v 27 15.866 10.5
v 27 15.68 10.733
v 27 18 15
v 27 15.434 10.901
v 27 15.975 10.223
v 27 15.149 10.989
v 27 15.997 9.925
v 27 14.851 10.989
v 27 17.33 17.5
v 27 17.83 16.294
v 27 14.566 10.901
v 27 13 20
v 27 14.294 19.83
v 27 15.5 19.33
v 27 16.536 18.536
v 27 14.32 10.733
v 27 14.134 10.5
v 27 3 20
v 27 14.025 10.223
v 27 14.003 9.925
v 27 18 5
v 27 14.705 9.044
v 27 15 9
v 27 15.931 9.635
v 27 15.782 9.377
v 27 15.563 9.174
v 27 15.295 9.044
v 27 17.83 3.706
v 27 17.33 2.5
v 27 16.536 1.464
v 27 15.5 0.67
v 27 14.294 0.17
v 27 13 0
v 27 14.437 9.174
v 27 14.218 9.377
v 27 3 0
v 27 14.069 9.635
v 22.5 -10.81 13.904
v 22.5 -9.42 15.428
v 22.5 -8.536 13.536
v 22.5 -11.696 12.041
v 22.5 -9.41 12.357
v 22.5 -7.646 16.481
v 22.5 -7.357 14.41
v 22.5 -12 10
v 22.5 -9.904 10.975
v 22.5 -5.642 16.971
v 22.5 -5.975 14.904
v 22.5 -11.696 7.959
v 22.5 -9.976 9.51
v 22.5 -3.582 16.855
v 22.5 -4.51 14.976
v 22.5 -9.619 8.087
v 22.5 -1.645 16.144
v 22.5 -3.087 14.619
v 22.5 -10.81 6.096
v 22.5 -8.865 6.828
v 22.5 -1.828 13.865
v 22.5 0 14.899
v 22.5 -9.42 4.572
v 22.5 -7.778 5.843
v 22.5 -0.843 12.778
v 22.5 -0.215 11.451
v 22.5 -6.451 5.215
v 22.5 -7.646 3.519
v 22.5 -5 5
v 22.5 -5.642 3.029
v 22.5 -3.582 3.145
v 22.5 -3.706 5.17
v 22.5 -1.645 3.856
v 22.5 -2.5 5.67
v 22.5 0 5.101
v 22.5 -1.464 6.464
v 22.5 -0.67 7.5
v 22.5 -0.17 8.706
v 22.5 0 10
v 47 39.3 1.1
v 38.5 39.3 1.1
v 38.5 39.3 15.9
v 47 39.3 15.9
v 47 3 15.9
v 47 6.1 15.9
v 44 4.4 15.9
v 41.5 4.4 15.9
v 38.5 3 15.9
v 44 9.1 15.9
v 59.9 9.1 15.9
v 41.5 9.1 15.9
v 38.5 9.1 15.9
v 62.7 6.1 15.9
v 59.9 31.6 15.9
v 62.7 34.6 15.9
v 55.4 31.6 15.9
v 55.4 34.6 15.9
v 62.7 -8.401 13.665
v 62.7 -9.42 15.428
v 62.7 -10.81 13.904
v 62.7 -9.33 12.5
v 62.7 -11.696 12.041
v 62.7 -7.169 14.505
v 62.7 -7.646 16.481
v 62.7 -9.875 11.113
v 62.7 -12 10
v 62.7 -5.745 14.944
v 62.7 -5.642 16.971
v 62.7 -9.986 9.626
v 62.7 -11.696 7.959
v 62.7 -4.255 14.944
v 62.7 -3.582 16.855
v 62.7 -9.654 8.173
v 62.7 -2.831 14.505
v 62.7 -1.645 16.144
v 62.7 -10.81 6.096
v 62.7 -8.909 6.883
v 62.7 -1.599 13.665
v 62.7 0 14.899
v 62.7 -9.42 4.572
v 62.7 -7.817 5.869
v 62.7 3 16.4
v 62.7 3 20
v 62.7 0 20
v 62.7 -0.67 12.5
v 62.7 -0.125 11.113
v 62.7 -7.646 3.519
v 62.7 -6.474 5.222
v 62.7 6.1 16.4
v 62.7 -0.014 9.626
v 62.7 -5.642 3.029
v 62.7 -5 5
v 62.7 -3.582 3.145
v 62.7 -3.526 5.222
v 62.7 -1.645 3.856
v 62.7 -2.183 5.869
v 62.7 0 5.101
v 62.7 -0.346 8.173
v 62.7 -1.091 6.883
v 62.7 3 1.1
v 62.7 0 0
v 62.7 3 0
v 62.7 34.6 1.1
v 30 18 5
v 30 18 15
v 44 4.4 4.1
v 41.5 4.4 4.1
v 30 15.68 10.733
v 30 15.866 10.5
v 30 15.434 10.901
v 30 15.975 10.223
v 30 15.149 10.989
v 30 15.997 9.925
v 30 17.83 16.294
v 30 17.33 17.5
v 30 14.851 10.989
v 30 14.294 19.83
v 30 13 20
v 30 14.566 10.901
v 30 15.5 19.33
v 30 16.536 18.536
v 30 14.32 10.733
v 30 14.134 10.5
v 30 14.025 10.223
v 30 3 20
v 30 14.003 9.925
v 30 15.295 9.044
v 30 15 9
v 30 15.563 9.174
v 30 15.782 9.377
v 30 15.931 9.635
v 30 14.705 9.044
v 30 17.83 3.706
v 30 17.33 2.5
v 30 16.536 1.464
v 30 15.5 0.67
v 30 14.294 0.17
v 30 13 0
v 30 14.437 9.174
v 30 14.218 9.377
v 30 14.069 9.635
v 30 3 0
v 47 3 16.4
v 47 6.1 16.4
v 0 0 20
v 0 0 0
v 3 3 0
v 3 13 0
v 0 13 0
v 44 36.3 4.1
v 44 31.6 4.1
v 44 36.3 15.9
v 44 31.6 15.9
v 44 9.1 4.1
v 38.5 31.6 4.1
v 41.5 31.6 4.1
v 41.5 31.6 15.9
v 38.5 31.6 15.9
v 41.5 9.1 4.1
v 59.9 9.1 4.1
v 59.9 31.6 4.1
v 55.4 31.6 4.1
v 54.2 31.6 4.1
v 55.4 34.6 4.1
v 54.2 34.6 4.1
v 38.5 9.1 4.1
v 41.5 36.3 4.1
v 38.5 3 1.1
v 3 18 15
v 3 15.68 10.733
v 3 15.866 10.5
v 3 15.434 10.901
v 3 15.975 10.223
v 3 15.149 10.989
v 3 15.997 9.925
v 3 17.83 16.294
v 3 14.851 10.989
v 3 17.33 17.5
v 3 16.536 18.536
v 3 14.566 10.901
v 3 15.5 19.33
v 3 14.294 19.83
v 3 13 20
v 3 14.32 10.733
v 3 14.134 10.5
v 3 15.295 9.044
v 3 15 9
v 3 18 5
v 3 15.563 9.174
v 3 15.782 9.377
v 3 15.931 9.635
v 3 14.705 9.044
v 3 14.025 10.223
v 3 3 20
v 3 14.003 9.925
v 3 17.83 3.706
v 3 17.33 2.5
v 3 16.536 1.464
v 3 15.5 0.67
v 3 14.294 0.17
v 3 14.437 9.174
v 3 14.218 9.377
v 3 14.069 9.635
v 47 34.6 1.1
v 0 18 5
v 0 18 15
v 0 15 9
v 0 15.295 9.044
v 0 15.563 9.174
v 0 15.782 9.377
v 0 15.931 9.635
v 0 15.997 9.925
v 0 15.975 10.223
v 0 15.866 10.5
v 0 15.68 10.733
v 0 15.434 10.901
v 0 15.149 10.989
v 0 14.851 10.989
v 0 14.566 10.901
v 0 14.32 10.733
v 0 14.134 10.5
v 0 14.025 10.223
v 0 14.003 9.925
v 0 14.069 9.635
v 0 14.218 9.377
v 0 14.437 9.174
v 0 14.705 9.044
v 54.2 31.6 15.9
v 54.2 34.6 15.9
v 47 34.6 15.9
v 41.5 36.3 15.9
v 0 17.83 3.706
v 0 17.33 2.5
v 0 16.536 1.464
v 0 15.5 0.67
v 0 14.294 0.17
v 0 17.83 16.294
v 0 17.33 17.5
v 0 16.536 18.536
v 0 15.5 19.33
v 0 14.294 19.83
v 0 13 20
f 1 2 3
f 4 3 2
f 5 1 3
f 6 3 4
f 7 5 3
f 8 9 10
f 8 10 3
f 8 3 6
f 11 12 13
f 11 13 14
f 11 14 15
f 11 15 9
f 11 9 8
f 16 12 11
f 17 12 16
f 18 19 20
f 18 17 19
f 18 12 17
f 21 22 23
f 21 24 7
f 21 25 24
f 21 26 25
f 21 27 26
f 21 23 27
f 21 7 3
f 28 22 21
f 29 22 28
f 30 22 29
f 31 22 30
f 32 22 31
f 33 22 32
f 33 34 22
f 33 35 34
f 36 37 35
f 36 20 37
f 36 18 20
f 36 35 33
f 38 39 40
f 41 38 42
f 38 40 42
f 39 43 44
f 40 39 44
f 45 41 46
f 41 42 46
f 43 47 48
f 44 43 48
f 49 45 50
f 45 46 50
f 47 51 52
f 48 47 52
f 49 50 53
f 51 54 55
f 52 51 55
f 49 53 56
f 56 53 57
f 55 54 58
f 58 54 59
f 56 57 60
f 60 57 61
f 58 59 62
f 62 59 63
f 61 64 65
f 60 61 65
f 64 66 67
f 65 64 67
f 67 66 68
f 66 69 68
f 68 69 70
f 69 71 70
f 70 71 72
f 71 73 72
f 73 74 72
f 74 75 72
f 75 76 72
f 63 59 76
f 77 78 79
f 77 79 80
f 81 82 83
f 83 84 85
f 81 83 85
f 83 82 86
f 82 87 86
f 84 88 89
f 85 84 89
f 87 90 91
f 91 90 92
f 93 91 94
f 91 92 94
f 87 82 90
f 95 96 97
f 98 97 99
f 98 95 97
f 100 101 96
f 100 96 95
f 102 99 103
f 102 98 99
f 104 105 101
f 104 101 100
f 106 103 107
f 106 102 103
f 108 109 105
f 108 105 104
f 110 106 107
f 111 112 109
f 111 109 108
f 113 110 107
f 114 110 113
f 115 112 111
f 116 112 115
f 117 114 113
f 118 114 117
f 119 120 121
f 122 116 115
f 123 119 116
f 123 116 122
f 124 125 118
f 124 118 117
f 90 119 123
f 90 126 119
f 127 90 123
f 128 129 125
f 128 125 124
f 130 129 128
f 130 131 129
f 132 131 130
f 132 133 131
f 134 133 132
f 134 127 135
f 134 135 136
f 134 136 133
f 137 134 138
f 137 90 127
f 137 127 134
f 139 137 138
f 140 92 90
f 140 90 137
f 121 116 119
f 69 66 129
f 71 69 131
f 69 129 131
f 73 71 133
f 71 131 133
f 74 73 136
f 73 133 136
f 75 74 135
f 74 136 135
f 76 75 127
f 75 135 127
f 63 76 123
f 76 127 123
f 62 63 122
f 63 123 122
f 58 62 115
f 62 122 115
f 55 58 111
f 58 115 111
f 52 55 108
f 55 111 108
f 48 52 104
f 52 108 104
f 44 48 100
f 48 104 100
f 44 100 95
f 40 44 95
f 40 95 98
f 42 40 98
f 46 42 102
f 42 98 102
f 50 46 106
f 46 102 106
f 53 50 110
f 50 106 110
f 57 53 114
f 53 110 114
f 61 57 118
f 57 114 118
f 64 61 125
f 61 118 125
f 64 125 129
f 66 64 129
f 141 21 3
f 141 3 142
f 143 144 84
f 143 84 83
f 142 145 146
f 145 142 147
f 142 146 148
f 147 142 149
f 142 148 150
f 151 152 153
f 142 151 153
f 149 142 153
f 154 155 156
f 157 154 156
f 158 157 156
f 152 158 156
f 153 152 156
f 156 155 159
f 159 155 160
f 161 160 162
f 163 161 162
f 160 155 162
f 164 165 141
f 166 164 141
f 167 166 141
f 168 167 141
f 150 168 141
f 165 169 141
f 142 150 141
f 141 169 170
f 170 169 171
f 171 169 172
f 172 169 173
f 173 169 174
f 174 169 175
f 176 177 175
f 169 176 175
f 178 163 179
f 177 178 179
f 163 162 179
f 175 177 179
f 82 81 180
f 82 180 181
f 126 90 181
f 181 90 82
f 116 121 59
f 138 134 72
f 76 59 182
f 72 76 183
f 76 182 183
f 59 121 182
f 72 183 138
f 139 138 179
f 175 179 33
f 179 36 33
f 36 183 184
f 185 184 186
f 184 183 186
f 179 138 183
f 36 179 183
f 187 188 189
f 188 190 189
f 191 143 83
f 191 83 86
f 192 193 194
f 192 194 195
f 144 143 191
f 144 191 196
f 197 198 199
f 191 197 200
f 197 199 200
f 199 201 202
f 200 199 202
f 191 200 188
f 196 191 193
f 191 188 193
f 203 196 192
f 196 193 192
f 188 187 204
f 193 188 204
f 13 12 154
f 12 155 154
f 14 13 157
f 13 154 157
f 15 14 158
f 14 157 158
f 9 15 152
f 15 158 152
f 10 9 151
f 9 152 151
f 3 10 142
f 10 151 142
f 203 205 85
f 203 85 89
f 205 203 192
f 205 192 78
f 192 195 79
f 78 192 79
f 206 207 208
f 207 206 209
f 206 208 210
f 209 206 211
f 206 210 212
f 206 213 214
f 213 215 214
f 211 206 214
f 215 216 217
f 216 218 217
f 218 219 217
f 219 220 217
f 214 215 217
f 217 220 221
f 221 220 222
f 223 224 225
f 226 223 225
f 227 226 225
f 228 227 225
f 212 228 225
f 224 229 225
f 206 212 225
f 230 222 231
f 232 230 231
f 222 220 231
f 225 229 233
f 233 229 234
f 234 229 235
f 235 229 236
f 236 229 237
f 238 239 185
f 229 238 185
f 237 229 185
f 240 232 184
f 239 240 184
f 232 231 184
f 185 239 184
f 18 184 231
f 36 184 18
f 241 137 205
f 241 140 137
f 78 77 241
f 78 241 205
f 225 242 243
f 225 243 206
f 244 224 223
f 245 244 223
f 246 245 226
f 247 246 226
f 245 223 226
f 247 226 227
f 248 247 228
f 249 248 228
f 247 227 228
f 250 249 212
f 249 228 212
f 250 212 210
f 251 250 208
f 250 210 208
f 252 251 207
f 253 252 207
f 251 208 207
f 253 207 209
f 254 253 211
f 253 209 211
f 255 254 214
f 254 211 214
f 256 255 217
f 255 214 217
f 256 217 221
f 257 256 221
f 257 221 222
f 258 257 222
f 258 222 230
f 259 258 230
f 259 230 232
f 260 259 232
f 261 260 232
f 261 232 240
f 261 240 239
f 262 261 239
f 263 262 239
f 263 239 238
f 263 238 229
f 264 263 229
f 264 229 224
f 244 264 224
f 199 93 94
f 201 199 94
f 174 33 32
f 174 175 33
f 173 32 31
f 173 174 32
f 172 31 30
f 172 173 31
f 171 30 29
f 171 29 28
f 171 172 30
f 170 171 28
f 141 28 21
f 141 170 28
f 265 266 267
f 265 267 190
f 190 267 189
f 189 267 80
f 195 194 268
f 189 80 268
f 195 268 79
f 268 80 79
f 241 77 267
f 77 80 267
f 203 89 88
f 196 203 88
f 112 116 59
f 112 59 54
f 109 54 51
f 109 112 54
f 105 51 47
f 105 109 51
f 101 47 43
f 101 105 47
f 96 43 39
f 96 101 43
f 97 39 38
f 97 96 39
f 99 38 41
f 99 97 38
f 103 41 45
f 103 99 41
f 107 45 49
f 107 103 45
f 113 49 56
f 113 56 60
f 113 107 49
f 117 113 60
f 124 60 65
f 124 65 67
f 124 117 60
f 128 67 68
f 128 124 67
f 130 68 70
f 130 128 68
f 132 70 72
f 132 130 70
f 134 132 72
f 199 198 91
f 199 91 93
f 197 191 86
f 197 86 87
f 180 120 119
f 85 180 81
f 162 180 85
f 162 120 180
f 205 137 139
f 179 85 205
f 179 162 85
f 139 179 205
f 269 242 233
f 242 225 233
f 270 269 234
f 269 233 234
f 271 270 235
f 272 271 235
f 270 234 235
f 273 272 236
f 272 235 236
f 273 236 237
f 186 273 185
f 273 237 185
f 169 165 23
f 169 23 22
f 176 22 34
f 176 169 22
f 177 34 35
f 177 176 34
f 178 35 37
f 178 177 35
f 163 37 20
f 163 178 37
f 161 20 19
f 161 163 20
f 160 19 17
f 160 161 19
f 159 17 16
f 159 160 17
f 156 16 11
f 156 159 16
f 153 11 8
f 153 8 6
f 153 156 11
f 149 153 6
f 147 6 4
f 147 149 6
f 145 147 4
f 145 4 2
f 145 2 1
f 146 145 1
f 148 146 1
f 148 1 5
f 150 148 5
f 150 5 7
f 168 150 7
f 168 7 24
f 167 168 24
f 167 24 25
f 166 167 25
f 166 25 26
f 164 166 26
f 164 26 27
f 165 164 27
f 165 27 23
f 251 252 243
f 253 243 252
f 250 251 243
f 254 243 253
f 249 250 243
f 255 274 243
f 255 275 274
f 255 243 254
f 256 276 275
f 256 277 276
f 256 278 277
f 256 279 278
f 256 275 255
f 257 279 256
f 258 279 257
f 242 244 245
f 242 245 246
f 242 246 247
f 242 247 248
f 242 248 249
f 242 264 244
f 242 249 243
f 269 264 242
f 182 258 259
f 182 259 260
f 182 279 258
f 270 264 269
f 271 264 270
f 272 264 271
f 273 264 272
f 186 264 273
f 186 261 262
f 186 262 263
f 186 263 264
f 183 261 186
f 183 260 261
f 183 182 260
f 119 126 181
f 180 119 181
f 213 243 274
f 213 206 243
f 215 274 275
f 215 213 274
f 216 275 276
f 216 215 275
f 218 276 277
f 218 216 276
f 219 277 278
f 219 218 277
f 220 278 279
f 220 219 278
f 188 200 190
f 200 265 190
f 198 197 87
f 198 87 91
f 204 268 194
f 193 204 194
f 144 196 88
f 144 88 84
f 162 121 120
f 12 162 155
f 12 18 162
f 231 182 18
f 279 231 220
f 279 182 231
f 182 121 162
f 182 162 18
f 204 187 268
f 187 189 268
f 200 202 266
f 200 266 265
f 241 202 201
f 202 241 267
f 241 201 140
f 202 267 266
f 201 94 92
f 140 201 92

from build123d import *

# Parameters (mm, degrees)
SKETCH1_W           = 50
SKETCH1_H           = 20
BOSS_EXTRUDE1_DEPTH = 3
SKETCH2_W           = 3
SKETCH2_H           = 20
BOSS_EXTRUDE2_DEPTH = 15
SKETCH3_R           = 1
CUT_EXTRUDE1_DEPTH  = 15
FILLET1_R           = 5
SKETCH4_W           = 3
SKETCH4_H           = 20
BOSS_EXTRUDE3_DEPTH = 15
CUT_EXTRUDE2_START  = -15
SKETCH5_R           = 1
CUT_EXTRUDE2_DEPTH  = 15
FILLET2_R           = 5
BOSS_EXTRUDE4_DEPTH = 5.9
SKETCH7_W           = 20
SKETCH7_H           = 3
BOSS_EXTRUDE5_DEPTH = 12.8
SKETCH8_W           = 15.8
SKETCH8_H           = 3.1
BOSS_EXTRUDE6_DEPTH = 6.4
BOSS_EXTRUDE7_DEPTH = 3
SKETCH10_W          = 43.689261584
SKETCH10_H          = 59.678024431
CUT_EXTRUDE4_DEPTH  = 0.2
SKETCH11_R          = 7
SKETCH11_R_2        = 5
BOSS_EXTRUDE8_DEPTH = 40.2


with BuildPart() as part:
    # Sketch1 → Boss-Extrude1 (new body)
    with BuildSketch(Plane(origin=(0, 0, 0), x_dir=(1, 0, 0), z_dir=(0, 1, 0))):
        with Locations((25, -10)):
            Rectangle(SKETCH1_W, SKETCH1_H)
    extrude(amount=BOSS_EXTRUDE1_DEPTH)

    # Sketch2 → Boss-Extrude2 (add)
    with BuildSketch(Plane(origin=(0, 3, 0), x_dir=(1, 0, 0), z_dir=(0, 1, 0))):
        with Locations((1.5, -10)):
            Rectangle(SKETCH2_W, SKETCH2_H)
    extrude(amount=BOSS_EXTRUDE2_DEPTH)

    # Sketch3 → Cut-Extrude1 (cut)
    with BuildSketch(Plane(origin=(3, 0, 0), x_dir=(0, 0, -1), z_dir=(1, 0, 0))):
        with Locations((-10, 15)):
            Circle(SKETCH3_R)
    extrude(amount=-CUT_EXTRUDE1_DEPTH, mode=Mode.SUBTRACT)

    # Fillet1
    fillet1_edges = [part.edges().sort_by_distance(p)[0] for p in [
        (1.5, 18, 20),
        (1.5, 18, 0),
    ]]
    fillet(fillet1_edges, radius=FILLET1_R)

    # Sketch4 → Boss-Extrude3 (add)
    with BuildSketch(Plane(origin=(0, 3, 0), x_dir=(1, 0, 0), z_dir=(0, 1, 0))):
        with Locations((28.5, -10)):
            Rectangle(SKETCH4_W, SKETCH4_H)
    extrude(amount=BOSS_EXTRUDE3_DEPTH)

    # Sketch5 → Cut-Extrude2 (cut)
    with BuildSketch(Plane.ZY.offset(-27).offset(CUT_EXTRUDE2_START)):
        with Locations(Location((10, 15, 0), (0, 0, 180))):
            Circle(SKETCH5_R)
    extrude(amount=CUT_EXTRUDE2_DEPTH, mode=Mode.SUBTRACT)

    # Fillet2
    fillet2_edges = [part.edges().sort_by_distance(p)[0] for p in [
        (28.5, 18, 20),
        (28.5, 18, 0),
    ]]
    fillet(fillet2_edges, radius=FILLET2_R)

    # Sketch6 → Boss-Extrude4 (add, symmetric)
    with BuildSketch(Plane(origin=(0, 0, 10), x_dir=(-1, 0, 0), z_dir=(0, 0, -1))):
        Polygon((-38.5, 31.6), (-38.5, 34.6), (-38.5, 39.3), (-47, 39.3), (-47, 34.6), (-54.2, 34.6), (-54.2, 31.6), (-44, 31.6), (-44, 36.3), (-41.5, 36.3), (-41.5, 31.6), align=None)
        Polygon((-38.5, 1.4), (-38.5, 6.1), (-38.5, 9.1), (-41.5, 9.1), (-41.5, 4.4), (-44, 4.4), (-44, 9.1), (-59.9, 9.1), (-59.9, 31.6), (-55.4, 31.6), (-55.4, 34.6), (-62.9, 34.6), (-62.9, 6.1), (-47, 6.1), (-47, 1.4), align=None)
    extrude(amount=BOSS_EXTRUDE4_DEPTH, both=True)


with BuildPart() as boss_extrude4_piece_1:
    # of the separate pieces the step leaves, piece 1, a body of its own (boss_extrude4_pieces)
    add(part.part.solids().sort_by_distance((27, 13, 0))[0])

    # Sketch7 → Boss-Extrude5 (add)
    with BuildSketch(Plane(origin=(50, 0, 0), x_dir=(0, 0, -1), z_dir=(1, 0, 0))):
        with Locations((-10, 1.5)):
            Rectangle(SKETCH7_W, SKETCH7_H)
    extrude(amount=BOSS_EXTRUDE5_DEPTH)

    # Sketch8 → Boss-Extrude6 (add, symmetric)
    with BuildSketch(Plane(origin=(0, 0, 10), x_dir=(-1, 0, 0), z_dir=(0, 0, -1))):
        with Locations((-54.9, 4.55)):
            Rectangle(SKETCH8_W, SKETCH8_H)
    extrude(amount=BOSS_EXTRUDE6_DEPTH, both=True)



with BuildPart() as boss_extrude4_piece_2:
    # of the separate pieces the step leaves, piece 2, a body of its own (boss_extrude4_pieces)
    add(part.part.solids().sort_by_distance((38.5, 31.6, 15.9))[0])


with BuildPart() as boss_extrude4_piece_1_1:
    add(boss_extrude4_piece_1.part)

    add(boss_extrude4_piece_2.part)  # Boss-Extrude7 merges Boss-Extrude4 piece 2
    # Sketch9 → Boss-Extrude7 (add)
    with BuildSketch(Plane(origin=(0, 0, 4.1), x_dir=(-1, 0, 0), z_dir=(0, 0, -1))):
        Polygon((-38.5, 3), (-38.5, 39.3), (-47, 39.3), (-47, 34.6), (-62.9, 34.6), (-62.8, 3), align=None)
    extrude(amount=BOSS_EXTRUDE7_DEPTH)

    # Sketch10 → Cut-Extrude4 (cut)
    with BuildSketch(Plane(origin=(62.9, 0, 0), x_dir=(0, 0, -1), z_dir=(1, 0, 0))):
        with Locations((-9.388309177, 18.772485295)):
            Rectangle(SKETCH10_W, SKETCH10_H)
    extrude(amount=-CUT_EXTRUDE4_DEPTH, mode=Mode.SUBTRACT)

    # Sketch11 → Boss-Extrude8 (add)
    with BuildSketch(Plane(origin=(62.7, 0, 0), x_dir=(0, 0, -1), z_dir=(1, 0, 0))):
        with Locations((-10, -5)):
            Circle(SKETCH11_R)
        with Locations((-10, -5)):
            Circle(SKETCH11_R_2, mode=Mode.SUBTRACT)
    extrude(amount=-BOSS_EXTRUDE8_DEPTH)


solid = boss_extrude4_piece_1_1.part
